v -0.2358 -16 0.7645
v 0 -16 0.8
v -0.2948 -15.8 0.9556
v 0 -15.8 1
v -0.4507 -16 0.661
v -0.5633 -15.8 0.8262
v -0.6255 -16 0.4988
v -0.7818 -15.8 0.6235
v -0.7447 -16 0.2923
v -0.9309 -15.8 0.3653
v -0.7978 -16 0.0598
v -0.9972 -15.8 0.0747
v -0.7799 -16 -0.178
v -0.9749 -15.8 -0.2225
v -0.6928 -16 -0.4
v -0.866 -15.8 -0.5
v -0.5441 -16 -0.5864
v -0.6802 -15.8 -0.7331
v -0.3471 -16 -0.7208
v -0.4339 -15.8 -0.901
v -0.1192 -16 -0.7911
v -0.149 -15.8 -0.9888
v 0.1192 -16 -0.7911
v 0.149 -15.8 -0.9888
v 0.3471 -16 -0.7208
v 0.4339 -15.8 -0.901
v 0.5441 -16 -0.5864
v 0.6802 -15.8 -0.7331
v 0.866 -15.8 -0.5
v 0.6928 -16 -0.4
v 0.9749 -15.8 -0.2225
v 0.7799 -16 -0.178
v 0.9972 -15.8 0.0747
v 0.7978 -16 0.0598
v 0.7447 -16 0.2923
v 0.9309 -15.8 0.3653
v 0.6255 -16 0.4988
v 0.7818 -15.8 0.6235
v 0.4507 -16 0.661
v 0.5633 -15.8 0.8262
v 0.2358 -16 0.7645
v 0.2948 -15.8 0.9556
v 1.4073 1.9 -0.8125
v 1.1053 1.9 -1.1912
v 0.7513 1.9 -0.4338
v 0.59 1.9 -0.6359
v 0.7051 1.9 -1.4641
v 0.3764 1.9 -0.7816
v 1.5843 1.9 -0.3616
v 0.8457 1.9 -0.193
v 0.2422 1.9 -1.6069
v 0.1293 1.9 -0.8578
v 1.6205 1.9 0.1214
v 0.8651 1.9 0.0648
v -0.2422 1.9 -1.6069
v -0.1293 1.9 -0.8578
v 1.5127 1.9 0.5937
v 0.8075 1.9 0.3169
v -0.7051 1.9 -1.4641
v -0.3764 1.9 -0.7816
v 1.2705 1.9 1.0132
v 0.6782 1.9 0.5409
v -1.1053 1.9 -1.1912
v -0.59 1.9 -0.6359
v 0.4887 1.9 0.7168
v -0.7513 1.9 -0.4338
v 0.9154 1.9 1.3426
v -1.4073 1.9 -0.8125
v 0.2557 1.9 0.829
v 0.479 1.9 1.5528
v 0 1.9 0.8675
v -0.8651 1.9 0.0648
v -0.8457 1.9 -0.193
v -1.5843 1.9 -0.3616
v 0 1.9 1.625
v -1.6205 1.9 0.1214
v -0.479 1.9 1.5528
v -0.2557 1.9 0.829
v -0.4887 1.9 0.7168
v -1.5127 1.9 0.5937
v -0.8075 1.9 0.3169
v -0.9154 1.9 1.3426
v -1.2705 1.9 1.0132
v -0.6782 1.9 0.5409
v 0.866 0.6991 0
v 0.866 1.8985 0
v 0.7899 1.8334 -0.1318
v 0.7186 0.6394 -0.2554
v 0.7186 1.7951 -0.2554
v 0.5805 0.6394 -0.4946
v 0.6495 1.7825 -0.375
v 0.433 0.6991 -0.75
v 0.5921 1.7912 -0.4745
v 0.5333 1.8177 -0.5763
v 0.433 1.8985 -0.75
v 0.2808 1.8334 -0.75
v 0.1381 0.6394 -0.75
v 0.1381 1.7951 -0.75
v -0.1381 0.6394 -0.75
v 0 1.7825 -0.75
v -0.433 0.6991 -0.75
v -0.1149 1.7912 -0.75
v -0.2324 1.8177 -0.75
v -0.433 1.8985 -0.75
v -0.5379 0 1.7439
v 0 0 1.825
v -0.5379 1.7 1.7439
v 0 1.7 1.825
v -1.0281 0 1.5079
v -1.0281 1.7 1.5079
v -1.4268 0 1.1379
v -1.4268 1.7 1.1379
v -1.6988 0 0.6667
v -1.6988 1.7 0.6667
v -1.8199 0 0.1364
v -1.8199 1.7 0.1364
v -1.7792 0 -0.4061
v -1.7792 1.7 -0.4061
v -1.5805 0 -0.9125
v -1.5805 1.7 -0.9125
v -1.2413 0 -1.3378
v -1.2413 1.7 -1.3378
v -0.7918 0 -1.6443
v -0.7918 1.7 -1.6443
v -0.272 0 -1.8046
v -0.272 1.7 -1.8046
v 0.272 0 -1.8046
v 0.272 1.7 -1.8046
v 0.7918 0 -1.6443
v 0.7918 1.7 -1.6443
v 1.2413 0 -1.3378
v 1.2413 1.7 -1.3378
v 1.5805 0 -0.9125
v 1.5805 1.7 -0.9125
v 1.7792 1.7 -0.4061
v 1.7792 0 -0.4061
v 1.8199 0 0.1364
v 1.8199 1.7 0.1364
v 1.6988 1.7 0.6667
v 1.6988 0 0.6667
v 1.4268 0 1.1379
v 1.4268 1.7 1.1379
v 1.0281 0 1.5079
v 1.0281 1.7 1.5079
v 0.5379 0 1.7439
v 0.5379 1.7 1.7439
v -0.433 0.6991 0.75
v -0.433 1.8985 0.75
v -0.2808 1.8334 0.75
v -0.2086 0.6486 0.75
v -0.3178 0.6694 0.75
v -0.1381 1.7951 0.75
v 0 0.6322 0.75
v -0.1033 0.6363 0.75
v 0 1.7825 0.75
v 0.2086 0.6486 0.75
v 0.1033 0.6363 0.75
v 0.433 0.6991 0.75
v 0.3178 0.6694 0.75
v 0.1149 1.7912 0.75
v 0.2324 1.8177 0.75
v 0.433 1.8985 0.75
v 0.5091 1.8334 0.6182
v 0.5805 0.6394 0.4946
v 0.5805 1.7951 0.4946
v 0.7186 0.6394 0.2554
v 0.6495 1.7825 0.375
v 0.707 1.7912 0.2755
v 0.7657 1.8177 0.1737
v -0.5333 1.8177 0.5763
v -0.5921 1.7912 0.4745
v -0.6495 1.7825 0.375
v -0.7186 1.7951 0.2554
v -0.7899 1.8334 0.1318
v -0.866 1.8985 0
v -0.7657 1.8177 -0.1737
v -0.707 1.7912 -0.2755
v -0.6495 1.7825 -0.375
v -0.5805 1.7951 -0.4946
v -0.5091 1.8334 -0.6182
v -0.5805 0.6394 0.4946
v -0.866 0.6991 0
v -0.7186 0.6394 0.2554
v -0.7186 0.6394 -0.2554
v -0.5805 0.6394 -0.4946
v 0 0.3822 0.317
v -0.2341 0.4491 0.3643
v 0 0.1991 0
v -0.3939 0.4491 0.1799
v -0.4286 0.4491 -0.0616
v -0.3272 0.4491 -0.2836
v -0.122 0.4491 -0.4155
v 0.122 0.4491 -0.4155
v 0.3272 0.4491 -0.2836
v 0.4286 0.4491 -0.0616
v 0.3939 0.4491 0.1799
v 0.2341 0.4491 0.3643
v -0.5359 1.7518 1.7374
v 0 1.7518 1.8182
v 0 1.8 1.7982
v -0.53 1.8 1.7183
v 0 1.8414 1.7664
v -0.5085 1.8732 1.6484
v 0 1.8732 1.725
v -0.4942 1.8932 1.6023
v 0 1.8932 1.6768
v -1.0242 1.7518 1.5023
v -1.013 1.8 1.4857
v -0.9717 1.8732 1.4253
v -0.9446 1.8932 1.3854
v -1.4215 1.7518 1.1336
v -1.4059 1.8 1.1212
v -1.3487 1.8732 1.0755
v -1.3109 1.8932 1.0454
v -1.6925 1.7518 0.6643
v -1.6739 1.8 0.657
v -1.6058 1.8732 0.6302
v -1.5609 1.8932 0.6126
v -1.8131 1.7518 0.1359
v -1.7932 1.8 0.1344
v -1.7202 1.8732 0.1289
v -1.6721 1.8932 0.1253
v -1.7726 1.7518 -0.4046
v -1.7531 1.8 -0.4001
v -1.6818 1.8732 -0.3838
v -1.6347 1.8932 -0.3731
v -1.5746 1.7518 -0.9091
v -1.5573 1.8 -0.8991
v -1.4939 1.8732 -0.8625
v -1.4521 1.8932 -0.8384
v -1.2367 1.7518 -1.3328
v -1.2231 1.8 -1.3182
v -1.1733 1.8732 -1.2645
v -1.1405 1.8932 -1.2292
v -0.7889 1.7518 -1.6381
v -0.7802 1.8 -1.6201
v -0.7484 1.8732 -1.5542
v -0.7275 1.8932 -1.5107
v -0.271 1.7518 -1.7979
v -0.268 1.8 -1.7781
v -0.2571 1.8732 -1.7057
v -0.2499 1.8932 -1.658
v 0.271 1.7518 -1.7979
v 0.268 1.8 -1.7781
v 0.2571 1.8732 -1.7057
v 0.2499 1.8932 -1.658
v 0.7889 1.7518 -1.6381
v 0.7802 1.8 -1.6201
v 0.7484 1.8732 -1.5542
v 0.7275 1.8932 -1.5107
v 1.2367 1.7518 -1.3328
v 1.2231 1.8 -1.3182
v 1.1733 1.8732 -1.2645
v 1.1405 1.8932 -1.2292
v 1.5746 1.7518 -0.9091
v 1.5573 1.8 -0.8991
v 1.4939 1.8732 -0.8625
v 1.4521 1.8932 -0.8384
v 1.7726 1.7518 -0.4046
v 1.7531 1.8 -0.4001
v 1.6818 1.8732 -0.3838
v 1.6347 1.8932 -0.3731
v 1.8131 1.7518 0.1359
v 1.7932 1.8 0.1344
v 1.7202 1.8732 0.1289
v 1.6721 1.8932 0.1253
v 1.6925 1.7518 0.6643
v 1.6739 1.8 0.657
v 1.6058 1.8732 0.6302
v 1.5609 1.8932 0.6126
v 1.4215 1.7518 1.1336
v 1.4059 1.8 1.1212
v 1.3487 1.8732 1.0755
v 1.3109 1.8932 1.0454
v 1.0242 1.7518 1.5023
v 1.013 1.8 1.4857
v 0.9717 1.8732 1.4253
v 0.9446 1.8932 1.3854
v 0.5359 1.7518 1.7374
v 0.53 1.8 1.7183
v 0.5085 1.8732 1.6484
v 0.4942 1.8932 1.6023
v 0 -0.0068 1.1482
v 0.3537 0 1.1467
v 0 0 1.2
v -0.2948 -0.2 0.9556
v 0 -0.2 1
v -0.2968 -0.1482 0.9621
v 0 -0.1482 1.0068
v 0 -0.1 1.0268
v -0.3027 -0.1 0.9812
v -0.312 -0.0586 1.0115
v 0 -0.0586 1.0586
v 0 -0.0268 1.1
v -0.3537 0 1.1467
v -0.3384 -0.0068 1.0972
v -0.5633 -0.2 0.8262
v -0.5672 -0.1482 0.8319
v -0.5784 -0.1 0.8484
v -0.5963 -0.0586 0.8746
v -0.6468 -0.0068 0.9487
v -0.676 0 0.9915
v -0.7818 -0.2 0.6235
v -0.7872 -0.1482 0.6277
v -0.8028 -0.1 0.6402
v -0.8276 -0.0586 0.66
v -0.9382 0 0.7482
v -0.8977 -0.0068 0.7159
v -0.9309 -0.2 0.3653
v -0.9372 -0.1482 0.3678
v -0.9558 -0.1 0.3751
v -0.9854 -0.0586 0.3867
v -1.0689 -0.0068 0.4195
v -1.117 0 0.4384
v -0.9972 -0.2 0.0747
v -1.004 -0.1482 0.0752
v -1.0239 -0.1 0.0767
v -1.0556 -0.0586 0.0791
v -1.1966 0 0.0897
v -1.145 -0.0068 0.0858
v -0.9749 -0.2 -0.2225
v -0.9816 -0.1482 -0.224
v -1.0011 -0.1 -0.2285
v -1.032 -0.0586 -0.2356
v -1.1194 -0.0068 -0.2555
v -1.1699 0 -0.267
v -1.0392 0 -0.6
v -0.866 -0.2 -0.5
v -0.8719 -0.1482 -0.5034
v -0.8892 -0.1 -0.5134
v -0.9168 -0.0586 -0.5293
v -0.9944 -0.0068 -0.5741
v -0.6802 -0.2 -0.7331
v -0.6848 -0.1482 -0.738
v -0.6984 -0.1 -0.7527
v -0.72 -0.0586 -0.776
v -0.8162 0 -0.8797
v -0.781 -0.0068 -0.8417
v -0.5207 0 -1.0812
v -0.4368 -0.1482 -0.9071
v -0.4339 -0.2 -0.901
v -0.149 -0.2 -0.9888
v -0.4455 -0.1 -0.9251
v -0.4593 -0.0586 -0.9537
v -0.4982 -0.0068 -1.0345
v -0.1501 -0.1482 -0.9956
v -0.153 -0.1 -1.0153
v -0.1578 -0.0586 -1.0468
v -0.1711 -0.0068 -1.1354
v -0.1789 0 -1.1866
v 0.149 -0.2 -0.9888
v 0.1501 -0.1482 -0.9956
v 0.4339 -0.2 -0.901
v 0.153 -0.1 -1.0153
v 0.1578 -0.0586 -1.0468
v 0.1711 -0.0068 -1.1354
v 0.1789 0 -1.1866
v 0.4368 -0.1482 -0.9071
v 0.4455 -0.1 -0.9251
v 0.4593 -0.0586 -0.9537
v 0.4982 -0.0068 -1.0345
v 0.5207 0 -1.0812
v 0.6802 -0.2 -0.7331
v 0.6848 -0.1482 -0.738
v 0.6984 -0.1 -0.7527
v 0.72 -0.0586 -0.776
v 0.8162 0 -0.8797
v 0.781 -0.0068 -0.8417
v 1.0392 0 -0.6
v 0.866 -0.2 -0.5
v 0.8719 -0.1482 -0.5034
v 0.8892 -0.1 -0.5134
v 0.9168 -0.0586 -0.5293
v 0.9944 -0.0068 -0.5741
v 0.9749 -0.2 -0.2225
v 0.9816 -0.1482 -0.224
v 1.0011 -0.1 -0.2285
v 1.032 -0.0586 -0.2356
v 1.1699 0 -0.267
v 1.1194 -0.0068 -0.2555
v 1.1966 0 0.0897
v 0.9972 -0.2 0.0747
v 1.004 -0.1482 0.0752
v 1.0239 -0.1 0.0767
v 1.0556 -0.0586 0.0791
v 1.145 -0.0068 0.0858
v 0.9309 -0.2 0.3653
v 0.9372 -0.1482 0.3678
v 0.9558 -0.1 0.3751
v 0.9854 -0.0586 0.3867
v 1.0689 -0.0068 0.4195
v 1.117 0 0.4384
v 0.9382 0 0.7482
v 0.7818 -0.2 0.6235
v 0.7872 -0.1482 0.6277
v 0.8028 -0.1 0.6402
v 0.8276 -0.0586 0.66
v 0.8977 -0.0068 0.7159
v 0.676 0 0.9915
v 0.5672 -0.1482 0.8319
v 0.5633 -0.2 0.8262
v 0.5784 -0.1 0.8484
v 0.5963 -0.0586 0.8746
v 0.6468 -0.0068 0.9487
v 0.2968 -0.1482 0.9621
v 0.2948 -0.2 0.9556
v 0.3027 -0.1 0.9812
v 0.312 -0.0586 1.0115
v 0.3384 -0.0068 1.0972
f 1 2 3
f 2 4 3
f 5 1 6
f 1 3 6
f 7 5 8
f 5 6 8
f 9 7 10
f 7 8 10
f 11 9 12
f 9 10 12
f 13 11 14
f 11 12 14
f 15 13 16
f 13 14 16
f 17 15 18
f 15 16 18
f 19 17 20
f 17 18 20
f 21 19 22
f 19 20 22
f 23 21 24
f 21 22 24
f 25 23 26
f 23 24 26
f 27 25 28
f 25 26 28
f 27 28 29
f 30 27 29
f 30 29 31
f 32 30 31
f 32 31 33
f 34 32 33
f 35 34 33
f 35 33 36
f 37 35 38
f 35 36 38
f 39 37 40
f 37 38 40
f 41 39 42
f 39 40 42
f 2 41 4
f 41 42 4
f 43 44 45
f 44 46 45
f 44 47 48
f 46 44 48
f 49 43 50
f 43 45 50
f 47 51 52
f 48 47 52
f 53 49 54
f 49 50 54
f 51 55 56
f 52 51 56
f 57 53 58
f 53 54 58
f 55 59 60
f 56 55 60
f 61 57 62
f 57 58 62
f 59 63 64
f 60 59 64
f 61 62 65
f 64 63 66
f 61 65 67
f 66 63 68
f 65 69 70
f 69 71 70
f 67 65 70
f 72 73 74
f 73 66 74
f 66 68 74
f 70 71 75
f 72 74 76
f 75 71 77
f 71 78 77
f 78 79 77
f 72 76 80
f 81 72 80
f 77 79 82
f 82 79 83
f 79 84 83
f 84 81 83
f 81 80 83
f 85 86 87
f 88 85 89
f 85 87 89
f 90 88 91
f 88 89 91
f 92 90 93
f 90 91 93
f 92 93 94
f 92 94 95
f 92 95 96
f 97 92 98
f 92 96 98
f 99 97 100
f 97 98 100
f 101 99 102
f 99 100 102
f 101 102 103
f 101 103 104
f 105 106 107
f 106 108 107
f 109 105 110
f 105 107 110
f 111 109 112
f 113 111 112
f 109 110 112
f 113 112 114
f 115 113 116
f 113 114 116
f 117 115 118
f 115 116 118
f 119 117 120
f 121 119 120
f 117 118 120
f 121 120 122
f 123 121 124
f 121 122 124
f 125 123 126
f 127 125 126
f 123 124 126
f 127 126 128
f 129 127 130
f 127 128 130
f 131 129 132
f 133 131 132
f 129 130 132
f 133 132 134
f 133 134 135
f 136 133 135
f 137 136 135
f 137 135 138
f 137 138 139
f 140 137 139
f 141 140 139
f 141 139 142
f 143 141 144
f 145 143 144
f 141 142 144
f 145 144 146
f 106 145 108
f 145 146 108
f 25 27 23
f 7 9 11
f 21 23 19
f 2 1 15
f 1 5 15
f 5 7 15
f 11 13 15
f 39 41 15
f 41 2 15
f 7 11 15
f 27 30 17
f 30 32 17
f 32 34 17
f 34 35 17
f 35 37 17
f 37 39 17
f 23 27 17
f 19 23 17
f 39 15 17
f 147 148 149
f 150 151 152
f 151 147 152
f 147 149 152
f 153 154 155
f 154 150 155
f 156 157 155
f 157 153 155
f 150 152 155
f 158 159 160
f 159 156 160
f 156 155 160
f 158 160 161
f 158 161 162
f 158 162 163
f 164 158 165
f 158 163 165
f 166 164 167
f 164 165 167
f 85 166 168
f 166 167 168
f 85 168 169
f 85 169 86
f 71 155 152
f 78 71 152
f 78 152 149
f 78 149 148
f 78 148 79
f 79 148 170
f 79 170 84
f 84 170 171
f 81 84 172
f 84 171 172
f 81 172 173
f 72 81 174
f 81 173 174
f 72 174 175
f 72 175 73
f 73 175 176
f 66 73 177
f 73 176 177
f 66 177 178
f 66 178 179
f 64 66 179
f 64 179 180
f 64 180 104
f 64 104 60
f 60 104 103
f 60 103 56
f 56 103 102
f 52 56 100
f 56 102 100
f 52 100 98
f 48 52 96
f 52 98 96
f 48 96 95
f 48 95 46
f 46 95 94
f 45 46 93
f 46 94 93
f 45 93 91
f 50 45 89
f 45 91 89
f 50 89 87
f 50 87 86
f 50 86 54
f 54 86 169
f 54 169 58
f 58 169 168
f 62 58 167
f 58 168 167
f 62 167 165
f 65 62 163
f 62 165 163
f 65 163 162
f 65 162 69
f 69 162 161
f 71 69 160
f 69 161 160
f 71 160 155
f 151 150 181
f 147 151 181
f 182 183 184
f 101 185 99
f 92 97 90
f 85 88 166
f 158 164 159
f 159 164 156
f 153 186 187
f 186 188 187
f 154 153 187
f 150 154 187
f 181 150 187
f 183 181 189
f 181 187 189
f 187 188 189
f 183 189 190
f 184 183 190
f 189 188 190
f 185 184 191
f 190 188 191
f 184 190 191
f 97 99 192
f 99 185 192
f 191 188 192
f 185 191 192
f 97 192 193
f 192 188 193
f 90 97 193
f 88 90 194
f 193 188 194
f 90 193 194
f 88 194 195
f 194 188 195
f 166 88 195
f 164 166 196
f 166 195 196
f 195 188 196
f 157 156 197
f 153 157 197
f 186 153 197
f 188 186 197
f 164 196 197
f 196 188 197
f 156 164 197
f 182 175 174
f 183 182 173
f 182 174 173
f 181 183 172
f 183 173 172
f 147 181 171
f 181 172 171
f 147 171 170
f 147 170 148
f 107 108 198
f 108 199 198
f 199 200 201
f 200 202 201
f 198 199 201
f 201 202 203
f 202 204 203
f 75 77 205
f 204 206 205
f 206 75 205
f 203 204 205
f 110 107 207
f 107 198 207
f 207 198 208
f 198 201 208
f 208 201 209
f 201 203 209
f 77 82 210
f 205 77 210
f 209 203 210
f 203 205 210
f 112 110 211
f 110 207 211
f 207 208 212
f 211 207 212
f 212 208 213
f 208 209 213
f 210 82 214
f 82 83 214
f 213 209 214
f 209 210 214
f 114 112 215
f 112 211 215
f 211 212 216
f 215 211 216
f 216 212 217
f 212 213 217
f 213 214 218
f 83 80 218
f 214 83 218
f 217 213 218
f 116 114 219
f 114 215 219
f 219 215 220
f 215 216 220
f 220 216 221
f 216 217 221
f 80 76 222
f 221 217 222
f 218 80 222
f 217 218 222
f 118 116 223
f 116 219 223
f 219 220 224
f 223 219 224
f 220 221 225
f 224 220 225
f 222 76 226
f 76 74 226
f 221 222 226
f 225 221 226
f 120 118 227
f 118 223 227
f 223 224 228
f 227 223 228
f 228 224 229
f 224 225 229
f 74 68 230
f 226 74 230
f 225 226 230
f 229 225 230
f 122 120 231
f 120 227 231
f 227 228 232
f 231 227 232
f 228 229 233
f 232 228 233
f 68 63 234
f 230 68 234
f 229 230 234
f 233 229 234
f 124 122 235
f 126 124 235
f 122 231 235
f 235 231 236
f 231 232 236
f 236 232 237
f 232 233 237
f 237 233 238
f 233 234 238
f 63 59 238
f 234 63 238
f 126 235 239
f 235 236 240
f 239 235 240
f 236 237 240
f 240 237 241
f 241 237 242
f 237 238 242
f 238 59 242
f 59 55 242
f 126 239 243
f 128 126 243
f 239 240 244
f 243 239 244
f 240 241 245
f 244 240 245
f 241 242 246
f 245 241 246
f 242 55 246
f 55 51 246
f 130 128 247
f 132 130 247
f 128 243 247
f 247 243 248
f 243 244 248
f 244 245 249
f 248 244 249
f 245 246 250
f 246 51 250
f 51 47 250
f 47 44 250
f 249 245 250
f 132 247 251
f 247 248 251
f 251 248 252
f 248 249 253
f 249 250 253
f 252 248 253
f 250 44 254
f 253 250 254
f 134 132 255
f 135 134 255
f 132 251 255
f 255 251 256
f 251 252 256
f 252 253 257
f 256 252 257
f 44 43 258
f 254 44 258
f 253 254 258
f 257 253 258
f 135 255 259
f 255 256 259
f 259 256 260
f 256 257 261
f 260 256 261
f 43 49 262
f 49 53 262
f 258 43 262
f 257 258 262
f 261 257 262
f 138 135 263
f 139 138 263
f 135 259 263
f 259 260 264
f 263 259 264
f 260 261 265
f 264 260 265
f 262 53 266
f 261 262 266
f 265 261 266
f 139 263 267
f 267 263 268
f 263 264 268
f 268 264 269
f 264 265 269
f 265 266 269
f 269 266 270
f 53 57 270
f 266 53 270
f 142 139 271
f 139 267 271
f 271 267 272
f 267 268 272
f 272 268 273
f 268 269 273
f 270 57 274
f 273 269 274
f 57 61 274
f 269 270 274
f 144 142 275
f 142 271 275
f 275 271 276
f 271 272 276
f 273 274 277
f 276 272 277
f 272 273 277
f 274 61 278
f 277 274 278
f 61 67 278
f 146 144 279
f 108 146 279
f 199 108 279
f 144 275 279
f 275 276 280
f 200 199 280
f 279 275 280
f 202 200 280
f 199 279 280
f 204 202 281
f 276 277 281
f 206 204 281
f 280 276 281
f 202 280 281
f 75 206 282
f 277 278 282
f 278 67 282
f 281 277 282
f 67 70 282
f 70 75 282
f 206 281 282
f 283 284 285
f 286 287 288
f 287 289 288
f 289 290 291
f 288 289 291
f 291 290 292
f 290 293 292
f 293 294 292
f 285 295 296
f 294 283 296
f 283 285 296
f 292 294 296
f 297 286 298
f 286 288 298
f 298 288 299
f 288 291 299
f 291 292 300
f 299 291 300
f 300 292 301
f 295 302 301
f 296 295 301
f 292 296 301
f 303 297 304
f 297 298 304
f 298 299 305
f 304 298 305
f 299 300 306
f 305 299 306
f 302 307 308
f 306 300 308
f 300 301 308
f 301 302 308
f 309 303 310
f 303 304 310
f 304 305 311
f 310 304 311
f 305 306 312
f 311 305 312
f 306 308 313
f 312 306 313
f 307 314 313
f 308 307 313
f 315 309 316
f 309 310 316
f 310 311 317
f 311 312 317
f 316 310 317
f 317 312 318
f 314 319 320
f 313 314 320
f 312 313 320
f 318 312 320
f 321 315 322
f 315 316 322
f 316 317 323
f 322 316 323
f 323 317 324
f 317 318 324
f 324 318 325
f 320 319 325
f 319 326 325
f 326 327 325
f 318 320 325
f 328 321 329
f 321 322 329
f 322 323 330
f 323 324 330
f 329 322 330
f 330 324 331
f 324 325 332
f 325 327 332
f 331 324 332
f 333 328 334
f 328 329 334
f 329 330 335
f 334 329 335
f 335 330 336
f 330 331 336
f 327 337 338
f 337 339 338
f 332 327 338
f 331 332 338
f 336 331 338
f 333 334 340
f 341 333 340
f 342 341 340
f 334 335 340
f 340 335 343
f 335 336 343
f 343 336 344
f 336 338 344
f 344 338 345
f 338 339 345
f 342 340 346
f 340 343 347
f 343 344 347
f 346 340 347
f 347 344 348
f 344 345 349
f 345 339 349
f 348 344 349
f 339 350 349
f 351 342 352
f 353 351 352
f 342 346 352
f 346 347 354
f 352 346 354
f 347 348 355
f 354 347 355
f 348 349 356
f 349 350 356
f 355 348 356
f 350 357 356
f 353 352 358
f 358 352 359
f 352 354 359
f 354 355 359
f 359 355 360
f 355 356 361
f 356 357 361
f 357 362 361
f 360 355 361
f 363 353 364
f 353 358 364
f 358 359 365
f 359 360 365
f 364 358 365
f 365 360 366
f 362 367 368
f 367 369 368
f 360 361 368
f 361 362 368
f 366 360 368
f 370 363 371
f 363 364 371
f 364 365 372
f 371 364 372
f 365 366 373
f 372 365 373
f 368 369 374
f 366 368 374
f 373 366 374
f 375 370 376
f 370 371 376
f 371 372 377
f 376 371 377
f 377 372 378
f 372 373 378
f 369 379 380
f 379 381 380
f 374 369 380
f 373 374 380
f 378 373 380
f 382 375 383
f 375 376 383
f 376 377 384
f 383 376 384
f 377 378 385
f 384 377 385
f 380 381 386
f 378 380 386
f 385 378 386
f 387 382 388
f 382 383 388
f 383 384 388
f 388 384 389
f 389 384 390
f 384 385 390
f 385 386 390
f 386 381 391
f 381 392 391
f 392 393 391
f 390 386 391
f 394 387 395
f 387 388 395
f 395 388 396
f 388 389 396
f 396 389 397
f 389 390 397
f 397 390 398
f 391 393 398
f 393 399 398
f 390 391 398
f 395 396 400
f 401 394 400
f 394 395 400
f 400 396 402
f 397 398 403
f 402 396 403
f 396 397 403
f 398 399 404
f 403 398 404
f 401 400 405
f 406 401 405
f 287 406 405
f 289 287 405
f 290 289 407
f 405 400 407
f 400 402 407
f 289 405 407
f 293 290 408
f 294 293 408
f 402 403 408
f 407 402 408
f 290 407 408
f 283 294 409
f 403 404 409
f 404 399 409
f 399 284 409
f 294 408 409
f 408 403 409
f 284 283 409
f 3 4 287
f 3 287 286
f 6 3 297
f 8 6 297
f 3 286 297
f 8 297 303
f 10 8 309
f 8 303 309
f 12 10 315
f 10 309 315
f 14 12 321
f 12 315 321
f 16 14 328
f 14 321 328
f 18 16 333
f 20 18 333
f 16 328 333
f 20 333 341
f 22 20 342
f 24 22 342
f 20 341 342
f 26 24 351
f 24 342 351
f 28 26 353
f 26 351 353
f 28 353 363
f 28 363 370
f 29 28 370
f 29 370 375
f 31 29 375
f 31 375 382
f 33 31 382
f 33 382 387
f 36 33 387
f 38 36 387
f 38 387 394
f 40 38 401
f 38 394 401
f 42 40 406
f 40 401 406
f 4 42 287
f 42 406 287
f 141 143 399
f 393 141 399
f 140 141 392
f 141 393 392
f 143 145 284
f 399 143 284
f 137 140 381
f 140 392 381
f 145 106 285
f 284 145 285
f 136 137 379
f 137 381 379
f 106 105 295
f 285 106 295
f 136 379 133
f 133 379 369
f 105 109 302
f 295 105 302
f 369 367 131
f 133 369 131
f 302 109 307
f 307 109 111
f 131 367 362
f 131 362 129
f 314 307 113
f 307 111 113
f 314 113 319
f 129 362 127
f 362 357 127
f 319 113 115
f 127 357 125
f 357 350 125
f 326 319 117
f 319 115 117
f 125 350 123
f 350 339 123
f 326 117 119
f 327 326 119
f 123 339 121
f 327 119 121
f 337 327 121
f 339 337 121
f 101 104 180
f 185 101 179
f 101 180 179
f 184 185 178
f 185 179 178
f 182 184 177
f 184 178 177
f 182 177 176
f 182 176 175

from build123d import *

# Parameters (mm, degrees)
CUT_EXTRUDE1_DEPTH  = 1.1
BOSS_EXTRUDE1_REACH = 20.585
BOSS_EXTRUDE1_START = -0.5
SKETCH2_3_R         = 1.309481769


with BuildPart() as part:
    # Sketch1 → Revolve1 (revolve)
    with BuildSketch(Plane(origin=(0, 0, 0), x_dir=(0, 0, -1), z_dir=(1, 0, 0))):
        with BuildLine():
            Line((0, -16), (0.8, -16))
            Line((0.8, -16), (1, -15.8))
            Line((1, -15.8), (1, -0.2))
            ThreePointArc((1, -0.2), (1.058578644, -0.058578644), (1.2, 0))
            Line((1.2, 0), (1.825, 0))
            Line((1.825, 0), (1.825, 1.7))
            ThreePointArc((1.825, 1.7), (1.766421356, 1.841421356), (1.625, 1.9))
            Line((1.625, 1.9), (0.8675, 1.9))
            Line((0.8675, 1.9), (0.75, 1.7825))
            Line((0.75, 1.7825), (0.75, 0.9))
            Line((0.75, 0.9), (0.8675, 0.9))
            Line((0.8675, 0.9), (0.8675, 0.7))
            Line((0.8675, 0.7), (0, 0.199148641))
            Line((0, 0.199148641), (0, -16))
        make_face()
    revolve(axis=Axis((0, 2.837665271, 0), (0, -1, 0)))

    # Sketch2 → Cut-Extrude1 (cut)
    with BuildSketch(Plane(origin=(0, 1.9, 0), x_dir=(1, 0, 0), z_dir=(0, 1, 0))):
        Polygon((-0.433012702, -0.75), (0.433012702, -0.75), (0.866025404, 0), (0.433012702, 0.75), (-0.433012702, 0.75), (-0.866025404, 0), align=None)
    extrude(amount=-CUT_EXTRUDE1_DEPTH, mode=Mode.SUBTRACT)

    # Boss-Extrude1: up to this cone (the profile starts inside it)
    boss_extrude1_end = Plane(origin=(0, 1.4, 0), z_dir=(0, 1, 0)).offset(-1.200850359) * Cone(1.732e-06, 42.202780918, 24.365785924, align=(Align.CENTER, Align.CENTER, Align.MIN), mode=Mode.PRIVATE)
    # Sketch2<3> → Boss-Extrude1 (add, up to the surface)
    with BuildSketch(Plane(origin=(0, 1.9, 0), x_dir=(1, 0, 0), z_dir=(0, 1, 0)).offset(BOSS_EXTRUDE1_START), mode=Mode.PRIVATE) as boss_extrude1_sk1:
        Circle(SKETCH2_3_R)
        Polygon((0.433012702, -0.75), (0.866025404, 0), (0.433012702, 0.75), (-0.433012702, 0.75), (-0.866025404, 0), (-0.433012702, -0.75), align=None, mode=Mode.SUBTRACT)
    boss_extrude1_tool1 = extrude(boss_extrude1_sk1.sketch, amount=-BOSS_EXTRUDE1_REACH, mode=Mode.PRIVATE) & boss_extrude1_end
    add(boss_extrude1_tool1.solids().sort_by_distance((-1.272444, 1.4, 0))[0])


solid = part.part
